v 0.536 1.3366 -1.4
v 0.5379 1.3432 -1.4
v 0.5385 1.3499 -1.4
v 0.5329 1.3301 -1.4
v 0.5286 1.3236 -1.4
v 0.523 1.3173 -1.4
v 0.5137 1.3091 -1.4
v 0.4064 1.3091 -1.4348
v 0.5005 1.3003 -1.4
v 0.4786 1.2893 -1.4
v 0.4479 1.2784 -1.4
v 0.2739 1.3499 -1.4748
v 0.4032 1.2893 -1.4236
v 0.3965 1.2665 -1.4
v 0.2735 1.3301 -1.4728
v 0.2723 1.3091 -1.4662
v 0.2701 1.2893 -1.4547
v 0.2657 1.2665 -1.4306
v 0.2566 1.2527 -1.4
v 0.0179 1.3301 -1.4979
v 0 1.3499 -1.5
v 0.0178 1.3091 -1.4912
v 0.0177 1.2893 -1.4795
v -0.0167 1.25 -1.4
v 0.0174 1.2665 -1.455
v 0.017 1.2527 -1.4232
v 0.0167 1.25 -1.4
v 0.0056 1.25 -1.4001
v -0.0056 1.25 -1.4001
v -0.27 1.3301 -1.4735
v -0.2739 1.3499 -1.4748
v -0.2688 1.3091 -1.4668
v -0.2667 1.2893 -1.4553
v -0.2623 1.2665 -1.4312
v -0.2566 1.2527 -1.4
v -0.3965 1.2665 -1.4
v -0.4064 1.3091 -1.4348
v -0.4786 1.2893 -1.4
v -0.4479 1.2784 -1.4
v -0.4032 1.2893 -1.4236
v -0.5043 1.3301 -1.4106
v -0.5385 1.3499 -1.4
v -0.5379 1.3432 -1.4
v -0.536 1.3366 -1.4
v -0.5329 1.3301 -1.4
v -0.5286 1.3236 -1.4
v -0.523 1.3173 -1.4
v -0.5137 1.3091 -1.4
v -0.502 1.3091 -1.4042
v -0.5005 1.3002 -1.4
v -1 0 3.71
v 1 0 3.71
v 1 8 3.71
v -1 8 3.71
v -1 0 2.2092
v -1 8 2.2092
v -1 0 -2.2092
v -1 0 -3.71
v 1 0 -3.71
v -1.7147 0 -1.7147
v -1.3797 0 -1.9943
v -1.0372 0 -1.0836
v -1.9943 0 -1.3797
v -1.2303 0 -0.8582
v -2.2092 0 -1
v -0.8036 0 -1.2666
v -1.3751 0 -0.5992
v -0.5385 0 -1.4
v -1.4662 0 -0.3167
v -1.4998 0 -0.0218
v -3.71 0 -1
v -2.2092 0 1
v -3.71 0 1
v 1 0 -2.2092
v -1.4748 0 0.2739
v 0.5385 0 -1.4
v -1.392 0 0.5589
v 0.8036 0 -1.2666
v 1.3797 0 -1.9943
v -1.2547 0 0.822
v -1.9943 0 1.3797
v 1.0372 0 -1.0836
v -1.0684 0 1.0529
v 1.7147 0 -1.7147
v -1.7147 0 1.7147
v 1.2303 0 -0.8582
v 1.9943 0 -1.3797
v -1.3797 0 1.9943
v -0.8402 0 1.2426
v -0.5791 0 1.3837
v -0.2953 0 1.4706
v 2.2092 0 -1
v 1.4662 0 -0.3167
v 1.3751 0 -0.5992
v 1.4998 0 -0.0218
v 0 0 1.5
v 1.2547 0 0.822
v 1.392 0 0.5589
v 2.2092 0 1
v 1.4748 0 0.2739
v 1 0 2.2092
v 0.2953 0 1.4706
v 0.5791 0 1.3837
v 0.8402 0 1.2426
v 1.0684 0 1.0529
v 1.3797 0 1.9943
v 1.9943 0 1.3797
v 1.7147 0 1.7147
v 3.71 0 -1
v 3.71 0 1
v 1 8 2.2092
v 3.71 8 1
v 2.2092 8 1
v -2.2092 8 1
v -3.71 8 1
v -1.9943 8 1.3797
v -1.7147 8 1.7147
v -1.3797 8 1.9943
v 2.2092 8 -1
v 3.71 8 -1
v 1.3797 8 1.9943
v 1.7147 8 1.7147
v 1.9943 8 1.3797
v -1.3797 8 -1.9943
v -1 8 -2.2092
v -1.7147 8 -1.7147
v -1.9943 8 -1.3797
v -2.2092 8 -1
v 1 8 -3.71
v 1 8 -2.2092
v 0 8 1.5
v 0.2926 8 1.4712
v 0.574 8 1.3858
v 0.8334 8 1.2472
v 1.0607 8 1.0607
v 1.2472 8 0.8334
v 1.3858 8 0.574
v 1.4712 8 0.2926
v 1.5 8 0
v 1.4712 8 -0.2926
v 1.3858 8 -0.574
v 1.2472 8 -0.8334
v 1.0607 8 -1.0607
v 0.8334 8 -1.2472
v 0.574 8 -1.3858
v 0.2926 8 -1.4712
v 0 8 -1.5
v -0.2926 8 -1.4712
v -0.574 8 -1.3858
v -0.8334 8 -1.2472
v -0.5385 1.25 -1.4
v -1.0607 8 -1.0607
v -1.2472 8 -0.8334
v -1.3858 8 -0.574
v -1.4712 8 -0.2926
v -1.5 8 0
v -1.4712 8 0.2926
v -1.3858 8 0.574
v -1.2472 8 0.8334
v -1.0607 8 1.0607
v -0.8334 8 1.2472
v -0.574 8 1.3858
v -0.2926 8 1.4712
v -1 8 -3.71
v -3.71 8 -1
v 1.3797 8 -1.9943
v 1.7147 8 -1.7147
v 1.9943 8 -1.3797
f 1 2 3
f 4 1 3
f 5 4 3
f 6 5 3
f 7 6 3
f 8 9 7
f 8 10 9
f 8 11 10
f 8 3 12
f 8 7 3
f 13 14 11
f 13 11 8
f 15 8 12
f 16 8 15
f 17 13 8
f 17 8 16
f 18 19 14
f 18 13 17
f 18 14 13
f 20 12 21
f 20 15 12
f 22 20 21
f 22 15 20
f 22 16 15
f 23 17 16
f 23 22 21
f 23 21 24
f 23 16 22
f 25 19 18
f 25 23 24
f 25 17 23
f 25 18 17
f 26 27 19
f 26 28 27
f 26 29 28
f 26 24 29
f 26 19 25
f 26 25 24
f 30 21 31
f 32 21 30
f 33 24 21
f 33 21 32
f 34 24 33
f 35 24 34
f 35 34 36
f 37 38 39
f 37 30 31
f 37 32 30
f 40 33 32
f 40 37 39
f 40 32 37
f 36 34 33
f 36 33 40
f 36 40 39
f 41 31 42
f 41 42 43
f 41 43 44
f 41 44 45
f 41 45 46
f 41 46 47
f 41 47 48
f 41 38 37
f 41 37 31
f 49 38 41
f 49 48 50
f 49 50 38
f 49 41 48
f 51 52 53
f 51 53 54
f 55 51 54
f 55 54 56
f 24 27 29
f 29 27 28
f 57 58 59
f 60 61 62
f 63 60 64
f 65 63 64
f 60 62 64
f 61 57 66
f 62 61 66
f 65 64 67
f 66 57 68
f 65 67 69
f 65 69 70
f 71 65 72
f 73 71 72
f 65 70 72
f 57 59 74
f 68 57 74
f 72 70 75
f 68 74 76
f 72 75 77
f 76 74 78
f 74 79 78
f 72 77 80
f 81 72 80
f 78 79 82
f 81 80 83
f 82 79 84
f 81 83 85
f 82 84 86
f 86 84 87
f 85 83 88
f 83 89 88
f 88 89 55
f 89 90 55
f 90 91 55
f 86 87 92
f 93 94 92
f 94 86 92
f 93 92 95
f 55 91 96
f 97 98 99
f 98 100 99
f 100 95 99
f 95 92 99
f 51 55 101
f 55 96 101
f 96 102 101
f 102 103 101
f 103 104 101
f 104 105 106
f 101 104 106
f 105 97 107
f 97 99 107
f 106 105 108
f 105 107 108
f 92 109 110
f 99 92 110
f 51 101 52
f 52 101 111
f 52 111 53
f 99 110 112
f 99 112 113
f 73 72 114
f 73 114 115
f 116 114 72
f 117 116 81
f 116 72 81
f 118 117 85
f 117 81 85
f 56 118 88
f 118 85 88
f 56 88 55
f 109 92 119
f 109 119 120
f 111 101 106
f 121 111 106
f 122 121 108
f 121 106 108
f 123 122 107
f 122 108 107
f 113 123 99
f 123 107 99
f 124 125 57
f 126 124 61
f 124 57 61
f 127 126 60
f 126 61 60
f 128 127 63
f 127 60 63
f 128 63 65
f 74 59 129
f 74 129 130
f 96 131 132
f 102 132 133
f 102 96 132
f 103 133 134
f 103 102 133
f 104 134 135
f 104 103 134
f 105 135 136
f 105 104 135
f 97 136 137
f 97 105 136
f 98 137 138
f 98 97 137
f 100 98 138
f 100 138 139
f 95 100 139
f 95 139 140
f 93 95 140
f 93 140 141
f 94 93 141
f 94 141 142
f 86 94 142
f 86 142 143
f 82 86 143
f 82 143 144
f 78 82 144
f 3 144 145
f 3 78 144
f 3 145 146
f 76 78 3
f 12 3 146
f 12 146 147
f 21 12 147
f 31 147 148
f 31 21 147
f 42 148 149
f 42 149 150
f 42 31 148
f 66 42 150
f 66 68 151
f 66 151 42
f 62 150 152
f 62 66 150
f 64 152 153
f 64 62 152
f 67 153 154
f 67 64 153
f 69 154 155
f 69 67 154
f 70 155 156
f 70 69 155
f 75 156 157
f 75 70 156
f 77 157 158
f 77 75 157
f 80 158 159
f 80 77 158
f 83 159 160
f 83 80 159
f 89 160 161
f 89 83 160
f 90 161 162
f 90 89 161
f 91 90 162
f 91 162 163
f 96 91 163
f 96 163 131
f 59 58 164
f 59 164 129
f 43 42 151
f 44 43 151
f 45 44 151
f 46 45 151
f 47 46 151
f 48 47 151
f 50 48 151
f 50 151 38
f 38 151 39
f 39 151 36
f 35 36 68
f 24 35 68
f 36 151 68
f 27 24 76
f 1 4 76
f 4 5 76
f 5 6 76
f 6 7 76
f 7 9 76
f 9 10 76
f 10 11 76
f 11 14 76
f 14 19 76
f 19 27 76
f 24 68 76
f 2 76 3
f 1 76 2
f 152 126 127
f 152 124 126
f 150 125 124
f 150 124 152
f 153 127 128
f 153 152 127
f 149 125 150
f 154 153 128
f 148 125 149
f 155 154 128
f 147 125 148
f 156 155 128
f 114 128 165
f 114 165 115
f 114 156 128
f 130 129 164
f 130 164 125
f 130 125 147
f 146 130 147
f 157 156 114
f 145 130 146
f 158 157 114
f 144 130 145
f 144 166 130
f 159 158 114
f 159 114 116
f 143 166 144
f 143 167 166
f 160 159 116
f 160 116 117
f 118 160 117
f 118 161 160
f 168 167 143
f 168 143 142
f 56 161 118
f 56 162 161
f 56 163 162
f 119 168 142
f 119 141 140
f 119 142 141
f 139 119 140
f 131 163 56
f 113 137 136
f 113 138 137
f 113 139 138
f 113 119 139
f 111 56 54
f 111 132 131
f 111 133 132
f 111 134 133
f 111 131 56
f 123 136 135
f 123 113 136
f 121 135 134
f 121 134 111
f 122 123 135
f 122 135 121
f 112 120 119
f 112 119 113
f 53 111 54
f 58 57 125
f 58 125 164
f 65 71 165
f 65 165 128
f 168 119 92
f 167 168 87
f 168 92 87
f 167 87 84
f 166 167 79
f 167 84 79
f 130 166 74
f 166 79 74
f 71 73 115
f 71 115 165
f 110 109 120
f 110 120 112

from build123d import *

# Parameters (mm, degrees)
SKETCH1_R           = 2.425
SKETCH1_R_2         = 1.5
BOSS_EXTRUDE1_DEPTH = 8
BOSS_EXTRUDE2_START = -8
BOSS_EXTRUDE2_DEPTH = 8
CIRPATTERN1_COUNT   = 4
BOSS_EXTRUDE3_DEPTH = 1.25
FILLET1_R           = 0.1


with BuildPart() as part:
    # Sketch1 → Boss-Extrude1 (new body)
    with BuildSketch(Plane(origin=(0, 0, 0), x_dir=(1, 0, 0), z_dir=(0, 1, 0))):
        with Locations(Location((0, 0, 0), (0, 0, 270))):
            Circle(SKETCH1_R)
        with Locations(Location((0, 0, 0), (0, 0, 270))):
            Circle(SKETCH1_R_2, mode=Mode.SUBTRACT)
    extrude(amount=BOSS_EXTRUDE1_DEPTH)

    # Sketch2 → Boss-Extrude2 (add)
    with BuildSketch(Plane(origin=(0, 8, 0), x_dir=(1, 0, 0), z_dir=(0, 1, 0)).offset(BOSS_EXTRUDE2_START)):
        with BuildLine():
            Line((-3.71, -1), (-3.71, 1))
            Line((-3.71, 1), (-2.209213661, 1))
            ThreePointArc((-2.209213661, 1), (-2.425, 0), (-2.209213661, -1))
            Line((-2.209213661, -1), (-3.71, -1))
        make_face()
    boss_extrude2 = extrude(amount=BOSS_EXTRUDE2_DEPTH)

    # CirPattern1: Boss-Extrude2 ×4 about axis
    cirpattern1_axis = Axis((0, 0, 0), (0, 1, 0))
    for i in range(1, CIRPATTERN1_COUNT):
        add(boss_extrude2.rotate(cirpattern1_axis, i * 360 / CIRPATTERN1_COUNT))

    # Sketch3 → Boss-Extrude3 (add)
    with BuildSketch(Plane.XZ):
        with BuildLine():
            Line((-0.538516481, -1.4), (0.538516481, -1.4))
            ThreePointArc((0.538516481, -1.4), (0, -1.5), (-0.538516481, -1.4))
        make_face()
    extrude(amount=-BOSS_EXTRUDE3_DEPTH)

    # Fillet1
    fillet1_edges = [part.edges().sort_by_distance(p)[0] for p in [
        (0, 1.25, -1.5),
    ]]
    fillet(fillet1_edges, radius=FILLET1_R - 0.0001)  # a hair under: the kernel refuses the full size


solid = part.part
